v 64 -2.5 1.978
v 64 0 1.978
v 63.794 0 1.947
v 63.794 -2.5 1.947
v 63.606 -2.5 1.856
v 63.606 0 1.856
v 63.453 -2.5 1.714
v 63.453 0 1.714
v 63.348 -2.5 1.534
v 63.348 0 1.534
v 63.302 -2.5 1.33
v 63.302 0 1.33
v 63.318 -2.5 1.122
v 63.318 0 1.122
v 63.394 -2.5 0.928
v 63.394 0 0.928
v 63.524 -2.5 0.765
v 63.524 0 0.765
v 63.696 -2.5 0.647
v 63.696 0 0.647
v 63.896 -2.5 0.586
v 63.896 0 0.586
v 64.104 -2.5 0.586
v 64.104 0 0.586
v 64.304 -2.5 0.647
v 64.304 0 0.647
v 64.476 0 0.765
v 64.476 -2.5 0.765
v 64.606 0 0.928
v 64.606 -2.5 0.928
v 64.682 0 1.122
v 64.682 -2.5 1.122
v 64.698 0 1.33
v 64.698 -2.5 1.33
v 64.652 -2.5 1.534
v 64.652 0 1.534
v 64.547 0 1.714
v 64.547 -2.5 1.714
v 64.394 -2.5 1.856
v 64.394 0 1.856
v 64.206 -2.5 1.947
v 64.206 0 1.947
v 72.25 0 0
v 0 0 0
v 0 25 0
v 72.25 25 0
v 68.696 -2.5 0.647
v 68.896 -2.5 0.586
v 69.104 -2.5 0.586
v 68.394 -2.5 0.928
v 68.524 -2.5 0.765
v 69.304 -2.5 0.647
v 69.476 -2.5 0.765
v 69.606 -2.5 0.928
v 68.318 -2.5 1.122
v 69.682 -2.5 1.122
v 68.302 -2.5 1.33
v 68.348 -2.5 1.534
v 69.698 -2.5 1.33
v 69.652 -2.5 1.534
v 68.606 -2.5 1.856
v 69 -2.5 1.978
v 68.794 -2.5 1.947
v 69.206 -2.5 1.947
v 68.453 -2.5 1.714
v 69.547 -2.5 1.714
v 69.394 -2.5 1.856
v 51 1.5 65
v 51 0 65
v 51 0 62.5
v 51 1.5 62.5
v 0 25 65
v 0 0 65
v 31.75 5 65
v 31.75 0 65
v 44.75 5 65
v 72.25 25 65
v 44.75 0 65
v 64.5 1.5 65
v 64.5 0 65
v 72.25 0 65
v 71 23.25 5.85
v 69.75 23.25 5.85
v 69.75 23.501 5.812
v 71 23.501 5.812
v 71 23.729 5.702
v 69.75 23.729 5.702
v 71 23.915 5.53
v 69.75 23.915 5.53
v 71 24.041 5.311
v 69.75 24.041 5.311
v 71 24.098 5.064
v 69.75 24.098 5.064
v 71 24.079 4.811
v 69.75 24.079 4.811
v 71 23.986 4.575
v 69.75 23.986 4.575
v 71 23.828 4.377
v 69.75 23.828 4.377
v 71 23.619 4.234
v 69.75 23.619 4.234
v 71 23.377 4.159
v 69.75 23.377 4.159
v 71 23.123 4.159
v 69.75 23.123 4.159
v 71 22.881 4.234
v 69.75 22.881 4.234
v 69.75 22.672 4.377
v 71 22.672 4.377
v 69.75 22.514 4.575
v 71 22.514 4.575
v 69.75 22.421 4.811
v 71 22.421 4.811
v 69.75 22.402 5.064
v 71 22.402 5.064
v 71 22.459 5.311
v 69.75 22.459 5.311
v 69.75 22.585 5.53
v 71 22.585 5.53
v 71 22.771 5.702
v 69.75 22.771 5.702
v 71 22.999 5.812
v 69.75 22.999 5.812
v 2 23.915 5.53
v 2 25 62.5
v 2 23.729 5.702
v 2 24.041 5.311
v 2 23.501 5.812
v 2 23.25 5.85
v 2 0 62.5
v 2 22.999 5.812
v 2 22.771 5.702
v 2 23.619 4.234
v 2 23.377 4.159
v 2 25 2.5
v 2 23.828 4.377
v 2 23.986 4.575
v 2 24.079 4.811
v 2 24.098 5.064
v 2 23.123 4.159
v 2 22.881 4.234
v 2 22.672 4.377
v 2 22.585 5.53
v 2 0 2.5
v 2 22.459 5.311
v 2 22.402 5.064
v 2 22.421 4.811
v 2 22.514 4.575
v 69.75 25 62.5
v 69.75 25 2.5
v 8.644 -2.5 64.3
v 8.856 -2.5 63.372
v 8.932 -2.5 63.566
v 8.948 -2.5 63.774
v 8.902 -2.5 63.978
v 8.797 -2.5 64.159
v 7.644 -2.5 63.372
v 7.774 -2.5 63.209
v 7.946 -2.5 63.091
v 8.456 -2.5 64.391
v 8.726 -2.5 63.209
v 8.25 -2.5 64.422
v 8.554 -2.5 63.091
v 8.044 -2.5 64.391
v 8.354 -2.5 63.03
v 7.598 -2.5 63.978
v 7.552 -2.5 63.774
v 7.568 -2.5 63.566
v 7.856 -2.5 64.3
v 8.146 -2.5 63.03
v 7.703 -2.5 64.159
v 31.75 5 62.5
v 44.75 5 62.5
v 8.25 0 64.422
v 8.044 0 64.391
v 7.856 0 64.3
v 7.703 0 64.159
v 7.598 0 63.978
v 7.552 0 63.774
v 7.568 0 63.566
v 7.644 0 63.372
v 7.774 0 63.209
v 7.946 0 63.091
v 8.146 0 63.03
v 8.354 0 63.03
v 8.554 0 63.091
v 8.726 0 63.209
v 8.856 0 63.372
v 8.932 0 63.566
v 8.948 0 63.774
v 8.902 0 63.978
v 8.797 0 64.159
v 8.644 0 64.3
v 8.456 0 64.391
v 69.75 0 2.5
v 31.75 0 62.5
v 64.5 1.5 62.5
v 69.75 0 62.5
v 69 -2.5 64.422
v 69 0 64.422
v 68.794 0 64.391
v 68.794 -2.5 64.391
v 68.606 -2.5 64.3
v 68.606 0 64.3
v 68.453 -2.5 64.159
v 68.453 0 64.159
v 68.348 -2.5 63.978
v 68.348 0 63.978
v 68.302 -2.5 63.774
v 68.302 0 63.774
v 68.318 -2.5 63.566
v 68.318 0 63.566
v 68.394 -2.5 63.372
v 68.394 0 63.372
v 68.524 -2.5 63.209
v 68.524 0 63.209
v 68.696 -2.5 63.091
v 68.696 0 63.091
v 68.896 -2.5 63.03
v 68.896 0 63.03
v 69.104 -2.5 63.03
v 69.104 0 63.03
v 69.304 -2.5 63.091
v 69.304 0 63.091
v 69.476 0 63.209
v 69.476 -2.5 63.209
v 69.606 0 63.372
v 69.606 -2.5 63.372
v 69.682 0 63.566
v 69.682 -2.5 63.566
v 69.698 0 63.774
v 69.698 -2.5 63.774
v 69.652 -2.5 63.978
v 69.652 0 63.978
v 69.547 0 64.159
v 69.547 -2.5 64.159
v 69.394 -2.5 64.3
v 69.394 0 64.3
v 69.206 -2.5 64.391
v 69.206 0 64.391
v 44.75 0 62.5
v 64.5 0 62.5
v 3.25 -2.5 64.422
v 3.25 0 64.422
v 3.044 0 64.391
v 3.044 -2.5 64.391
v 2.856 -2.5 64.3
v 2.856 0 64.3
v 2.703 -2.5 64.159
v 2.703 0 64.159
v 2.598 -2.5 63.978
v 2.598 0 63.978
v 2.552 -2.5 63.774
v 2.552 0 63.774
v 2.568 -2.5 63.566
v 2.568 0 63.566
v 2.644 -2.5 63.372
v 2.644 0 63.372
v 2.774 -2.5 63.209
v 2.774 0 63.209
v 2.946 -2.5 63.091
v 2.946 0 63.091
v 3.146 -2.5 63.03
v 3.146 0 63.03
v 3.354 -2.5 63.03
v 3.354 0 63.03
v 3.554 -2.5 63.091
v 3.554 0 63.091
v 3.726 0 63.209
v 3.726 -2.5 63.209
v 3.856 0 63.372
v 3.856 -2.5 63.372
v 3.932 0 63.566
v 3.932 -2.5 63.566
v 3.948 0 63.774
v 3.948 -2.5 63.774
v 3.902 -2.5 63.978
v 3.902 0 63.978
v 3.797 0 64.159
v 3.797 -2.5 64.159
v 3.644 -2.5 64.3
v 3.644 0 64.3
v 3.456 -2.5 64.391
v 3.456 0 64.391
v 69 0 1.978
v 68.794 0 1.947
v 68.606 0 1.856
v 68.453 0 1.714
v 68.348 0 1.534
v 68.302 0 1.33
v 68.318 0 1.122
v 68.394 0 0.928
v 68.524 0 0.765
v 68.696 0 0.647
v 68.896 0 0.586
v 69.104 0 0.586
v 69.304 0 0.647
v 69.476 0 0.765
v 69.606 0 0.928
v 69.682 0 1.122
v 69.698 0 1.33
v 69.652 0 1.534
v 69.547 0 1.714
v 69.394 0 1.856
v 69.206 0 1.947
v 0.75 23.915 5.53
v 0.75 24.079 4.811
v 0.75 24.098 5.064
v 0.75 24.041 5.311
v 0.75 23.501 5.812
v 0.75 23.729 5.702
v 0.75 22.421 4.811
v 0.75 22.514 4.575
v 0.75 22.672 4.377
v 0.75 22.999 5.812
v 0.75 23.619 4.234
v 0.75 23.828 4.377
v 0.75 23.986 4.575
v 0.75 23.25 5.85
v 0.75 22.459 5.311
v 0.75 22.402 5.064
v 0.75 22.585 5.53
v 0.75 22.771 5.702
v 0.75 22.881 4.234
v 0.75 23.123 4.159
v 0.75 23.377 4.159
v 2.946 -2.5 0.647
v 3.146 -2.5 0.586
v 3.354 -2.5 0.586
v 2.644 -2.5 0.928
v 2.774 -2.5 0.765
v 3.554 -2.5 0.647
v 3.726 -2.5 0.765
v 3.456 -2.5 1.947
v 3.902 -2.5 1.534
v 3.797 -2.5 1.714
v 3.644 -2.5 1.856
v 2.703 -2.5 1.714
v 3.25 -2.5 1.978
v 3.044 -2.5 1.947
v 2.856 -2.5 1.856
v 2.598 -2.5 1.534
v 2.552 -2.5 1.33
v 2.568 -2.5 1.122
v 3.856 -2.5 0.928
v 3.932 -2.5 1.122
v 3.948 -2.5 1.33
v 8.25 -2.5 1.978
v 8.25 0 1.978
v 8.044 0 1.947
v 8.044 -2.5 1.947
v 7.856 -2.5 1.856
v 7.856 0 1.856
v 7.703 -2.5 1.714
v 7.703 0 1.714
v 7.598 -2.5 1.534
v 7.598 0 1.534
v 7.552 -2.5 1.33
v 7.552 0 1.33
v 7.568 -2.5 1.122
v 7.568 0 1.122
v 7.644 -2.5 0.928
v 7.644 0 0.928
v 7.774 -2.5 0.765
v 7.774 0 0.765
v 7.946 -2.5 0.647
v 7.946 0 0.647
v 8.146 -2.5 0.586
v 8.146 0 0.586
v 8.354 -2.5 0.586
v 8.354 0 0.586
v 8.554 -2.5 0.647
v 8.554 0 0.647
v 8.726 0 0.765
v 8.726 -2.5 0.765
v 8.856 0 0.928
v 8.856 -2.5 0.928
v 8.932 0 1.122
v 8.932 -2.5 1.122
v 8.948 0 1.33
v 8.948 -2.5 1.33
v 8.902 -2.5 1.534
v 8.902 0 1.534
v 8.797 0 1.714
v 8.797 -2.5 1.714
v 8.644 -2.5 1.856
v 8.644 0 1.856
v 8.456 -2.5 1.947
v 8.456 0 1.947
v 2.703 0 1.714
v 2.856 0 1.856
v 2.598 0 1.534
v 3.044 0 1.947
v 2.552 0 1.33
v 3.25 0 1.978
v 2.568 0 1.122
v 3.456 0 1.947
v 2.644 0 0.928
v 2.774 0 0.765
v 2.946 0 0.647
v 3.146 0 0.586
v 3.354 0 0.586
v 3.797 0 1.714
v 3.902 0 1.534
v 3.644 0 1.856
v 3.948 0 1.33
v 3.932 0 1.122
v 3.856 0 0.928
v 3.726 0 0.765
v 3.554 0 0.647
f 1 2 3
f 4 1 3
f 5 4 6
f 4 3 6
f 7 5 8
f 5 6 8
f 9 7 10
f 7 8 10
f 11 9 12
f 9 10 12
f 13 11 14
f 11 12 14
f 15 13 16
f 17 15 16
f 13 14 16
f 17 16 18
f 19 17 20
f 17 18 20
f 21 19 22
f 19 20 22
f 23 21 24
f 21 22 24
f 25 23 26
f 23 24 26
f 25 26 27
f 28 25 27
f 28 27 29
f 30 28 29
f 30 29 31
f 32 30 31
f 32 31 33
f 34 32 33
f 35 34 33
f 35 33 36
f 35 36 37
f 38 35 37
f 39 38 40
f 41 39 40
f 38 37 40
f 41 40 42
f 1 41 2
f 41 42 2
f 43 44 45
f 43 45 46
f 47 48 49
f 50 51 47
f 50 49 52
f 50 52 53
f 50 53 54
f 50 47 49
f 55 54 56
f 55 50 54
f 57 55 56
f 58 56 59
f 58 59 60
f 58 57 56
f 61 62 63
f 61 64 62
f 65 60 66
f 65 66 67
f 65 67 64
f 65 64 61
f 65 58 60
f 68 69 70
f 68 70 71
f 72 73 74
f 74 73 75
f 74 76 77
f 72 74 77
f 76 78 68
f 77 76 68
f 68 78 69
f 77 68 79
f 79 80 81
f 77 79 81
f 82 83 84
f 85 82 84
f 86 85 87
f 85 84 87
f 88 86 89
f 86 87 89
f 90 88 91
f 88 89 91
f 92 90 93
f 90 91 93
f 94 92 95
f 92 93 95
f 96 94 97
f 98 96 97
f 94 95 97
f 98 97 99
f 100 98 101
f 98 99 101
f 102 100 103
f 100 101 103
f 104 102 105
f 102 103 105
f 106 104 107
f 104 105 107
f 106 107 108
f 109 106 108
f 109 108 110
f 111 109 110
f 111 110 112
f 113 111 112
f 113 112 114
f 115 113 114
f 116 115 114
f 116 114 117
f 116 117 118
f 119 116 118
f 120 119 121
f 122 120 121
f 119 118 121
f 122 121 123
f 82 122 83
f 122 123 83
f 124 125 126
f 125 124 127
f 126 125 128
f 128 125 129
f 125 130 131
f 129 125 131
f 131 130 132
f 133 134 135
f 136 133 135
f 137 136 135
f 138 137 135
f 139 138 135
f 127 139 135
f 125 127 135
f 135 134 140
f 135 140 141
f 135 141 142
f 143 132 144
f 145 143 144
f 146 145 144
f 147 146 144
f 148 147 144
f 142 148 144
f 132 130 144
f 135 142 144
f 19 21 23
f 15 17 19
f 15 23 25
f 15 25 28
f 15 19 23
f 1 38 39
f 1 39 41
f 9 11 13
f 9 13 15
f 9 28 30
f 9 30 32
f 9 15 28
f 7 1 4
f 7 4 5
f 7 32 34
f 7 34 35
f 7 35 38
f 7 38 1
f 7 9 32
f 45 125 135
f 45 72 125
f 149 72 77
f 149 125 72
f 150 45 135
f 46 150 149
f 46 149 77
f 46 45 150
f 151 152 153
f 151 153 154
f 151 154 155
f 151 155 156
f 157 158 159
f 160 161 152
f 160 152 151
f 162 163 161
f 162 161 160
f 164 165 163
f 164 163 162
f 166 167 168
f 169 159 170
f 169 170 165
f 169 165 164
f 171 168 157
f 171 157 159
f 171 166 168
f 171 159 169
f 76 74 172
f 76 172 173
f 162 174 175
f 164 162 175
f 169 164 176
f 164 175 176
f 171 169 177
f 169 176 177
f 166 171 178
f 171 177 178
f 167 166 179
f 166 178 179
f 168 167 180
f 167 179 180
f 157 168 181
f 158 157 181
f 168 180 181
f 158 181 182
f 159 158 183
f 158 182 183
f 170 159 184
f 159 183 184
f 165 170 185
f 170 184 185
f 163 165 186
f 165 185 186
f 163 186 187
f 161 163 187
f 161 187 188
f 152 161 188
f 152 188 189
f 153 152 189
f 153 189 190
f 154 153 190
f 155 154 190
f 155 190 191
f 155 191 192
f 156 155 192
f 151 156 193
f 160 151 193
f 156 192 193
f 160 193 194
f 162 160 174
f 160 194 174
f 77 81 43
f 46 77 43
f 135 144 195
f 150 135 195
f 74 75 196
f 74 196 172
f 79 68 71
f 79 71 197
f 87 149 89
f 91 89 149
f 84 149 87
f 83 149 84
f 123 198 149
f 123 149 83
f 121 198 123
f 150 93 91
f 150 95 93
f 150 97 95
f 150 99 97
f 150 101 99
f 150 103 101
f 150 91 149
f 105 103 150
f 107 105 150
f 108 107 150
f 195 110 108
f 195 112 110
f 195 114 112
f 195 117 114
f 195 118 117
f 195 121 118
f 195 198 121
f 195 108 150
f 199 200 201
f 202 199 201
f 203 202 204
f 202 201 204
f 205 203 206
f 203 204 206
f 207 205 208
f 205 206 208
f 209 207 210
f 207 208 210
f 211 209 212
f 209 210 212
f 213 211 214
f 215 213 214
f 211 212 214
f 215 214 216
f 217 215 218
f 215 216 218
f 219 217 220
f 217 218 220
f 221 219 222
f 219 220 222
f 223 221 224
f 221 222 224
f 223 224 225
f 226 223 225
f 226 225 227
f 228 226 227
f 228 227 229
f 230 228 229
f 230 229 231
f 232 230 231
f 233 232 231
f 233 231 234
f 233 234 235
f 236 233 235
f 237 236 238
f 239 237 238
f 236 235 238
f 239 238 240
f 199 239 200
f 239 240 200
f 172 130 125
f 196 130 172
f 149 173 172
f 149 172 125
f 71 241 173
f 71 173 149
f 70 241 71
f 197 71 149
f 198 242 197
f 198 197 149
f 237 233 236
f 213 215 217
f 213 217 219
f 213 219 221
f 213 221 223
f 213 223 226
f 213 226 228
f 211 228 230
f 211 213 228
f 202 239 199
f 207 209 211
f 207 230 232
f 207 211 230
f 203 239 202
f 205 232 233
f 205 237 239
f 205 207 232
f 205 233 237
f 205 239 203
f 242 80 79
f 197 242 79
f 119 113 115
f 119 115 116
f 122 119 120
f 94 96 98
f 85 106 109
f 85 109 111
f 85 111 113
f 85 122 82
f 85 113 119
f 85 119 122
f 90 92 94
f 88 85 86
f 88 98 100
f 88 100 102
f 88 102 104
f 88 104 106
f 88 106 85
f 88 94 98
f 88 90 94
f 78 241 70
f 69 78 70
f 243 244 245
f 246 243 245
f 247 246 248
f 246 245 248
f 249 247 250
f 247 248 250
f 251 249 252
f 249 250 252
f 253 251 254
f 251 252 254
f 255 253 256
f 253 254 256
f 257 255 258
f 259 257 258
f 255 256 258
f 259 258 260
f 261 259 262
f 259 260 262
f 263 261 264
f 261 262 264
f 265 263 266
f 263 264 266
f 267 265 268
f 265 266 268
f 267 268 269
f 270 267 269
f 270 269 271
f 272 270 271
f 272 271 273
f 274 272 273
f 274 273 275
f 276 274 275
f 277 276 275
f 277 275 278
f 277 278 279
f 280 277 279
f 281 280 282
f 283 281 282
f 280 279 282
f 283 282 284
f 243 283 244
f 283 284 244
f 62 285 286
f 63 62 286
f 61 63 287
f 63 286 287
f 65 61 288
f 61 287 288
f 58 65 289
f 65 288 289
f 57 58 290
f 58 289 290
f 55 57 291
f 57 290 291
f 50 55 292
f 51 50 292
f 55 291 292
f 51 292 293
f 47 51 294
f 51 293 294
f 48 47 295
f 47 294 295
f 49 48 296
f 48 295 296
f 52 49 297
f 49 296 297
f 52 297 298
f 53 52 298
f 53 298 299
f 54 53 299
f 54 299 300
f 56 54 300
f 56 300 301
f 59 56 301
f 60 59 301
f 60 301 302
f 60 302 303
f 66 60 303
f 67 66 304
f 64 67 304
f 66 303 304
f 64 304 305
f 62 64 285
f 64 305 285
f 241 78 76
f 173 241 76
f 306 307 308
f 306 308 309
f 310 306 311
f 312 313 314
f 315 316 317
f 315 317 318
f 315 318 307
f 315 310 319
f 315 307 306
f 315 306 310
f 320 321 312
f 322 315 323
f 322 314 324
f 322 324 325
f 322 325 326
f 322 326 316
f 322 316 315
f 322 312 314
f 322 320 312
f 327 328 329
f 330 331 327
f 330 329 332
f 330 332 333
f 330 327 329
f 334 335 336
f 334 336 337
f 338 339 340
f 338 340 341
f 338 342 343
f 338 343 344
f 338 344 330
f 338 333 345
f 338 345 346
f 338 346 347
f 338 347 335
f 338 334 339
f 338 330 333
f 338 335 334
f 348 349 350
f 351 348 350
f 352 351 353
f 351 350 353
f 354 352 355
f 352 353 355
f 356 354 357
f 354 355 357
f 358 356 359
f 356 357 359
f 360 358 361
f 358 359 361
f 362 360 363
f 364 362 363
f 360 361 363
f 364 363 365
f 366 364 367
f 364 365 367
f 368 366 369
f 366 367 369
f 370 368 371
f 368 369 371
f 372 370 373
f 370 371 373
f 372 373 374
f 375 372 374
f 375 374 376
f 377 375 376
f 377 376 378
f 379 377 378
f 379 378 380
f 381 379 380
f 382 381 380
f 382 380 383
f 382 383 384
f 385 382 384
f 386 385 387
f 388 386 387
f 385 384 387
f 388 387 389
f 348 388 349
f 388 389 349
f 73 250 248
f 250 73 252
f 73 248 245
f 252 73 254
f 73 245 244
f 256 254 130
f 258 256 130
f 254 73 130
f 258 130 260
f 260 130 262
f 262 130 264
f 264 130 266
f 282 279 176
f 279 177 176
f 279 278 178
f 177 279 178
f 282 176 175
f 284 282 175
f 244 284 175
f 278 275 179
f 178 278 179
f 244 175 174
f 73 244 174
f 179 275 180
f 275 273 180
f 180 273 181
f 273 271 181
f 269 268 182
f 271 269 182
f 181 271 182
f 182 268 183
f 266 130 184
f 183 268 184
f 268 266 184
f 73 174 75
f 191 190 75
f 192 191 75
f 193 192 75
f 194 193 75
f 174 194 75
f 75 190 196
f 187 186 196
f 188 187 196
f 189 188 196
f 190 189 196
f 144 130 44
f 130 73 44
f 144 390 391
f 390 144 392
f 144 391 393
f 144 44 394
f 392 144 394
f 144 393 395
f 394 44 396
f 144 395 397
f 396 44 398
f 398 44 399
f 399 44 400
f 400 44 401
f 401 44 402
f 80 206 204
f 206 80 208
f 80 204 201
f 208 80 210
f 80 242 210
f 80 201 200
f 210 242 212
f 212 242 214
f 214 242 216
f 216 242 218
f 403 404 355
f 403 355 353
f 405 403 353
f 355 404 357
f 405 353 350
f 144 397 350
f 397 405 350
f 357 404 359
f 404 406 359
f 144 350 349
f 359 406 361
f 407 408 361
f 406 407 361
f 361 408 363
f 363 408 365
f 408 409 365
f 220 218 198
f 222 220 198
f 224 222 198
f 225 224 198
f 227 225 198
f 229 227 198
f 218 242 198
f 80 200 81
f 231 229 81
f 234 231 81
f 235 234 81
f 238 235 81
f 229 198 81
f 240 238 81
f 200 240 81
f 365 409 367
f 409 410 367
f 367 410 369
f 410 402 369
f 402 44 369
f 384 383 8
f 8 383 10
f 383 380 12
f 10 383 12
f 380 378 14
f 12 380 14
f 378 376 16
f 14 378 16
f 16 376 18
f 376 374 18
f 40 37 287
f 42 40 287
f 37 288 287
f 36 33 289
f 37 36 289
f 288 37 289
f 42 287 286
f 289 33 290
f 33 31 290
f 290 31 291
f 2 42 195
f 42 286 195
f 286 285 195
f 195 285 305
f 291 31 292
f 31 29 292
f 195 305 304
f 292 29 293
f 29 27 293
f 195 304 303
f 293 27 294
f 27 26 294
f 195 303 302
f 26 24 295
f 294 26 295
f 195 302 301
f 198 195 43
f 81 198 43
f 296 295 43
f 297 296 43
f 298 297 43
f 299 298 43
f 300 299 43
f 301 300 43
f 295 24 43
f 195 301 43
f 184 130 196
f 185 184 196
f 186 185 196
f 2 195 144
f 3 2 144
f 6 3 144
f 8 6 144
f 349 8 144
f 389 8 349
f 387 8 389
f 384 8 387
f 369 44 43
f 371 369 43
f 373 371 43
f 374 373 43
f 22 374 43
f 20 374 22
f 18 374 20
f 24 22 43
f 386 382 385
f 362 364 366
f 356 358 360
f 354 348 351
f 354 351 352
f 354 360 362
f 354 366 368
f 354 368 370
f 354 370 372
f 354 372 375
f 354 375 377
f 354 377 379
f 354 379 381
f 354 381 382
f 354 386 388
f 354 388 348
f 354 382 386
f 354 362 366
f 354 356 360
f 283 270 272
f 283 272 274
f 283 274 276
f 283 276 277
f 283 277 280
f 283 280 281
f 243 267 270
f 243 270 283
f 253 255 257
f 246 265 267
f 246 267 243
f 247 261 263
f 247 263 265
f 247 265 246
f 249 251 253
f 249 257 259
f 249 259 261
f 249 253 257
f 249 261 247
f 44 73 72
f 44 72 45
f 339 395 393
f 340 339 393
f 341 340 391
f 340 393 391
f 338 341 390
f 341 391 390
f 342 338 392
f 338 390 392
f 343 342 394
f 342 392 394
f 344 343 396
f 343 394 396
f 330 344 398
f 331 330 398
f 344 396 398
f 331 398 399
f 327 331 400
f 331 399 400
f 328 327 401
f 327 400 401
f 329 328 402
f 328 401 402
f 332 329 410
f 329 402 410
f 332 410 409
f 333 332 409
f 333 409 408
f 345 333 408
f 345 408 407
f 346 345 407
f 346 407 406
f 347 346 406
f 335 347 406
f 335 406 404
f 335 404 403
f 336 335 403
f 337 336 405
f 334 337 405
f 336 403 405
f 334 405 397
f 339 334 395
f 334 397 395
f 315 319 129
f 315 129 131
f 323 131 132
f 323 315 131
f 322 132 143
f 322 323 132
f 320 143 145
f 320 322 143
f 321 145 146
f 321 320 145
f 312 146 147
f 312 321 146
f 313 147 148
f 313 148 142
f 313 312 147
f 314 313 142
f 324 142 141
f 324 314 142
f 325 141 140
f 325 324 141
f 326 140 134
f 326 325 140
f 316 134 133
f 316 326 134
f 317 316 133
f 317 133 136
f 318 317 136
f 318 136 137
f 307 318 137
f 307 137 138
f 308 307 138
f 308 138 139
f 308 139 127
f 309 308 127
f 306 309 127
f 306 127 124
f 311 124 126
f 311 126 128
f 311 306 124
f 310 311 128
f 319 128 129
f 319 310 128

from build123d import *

# Parameters (mm, degrees)
SKETCH1_W           = 72.25
SKETCH1_H           = 65
SKETCH1_W_2         = 67.75
SKETCH1_H_2         = 60
BOSS_EXTRUDE1_DEPTH = 25
SKETCH2_W           = 13
SKETCH2_H           = 5
SKETCH2_W_2         = 13.5
SKETCH2_H_2         = 1.5
CUT_EXTRUDE1_DEPTH  = 2.5
SKETCH5_R           = 0.7
BOSS_EXTRUDE2_DEPTH = 2.5
SKETCH7_R           = 0.85
CUT_EXTRUDE3_DEPTH  = 1.25
CUT_EXTRUDE4_START  = -1.25
SKETCH8_R           = 0.85
CUT_EXTRUDE4_DEPTH  = 1.25


with BuildPart() as part:
    # Sketch1 → Boss-Extrude1 (new body)
    with BuildSketch(Plane(origin=(0, 0, 0), x_dir=(1, 0, 0), z_dir=(0, 1, 0))):
        with Locations((36.125, -32.5)):
            Rectangle(SKETCH1_W, SKETCH1_H)
        with Locations((35.875, -32.5)):
            Rectangle(SKETCH1_W_2, SKETCH1_H_2, mode=Mode.SUBTRACT)
    extrude(amount=BOSS_EXTRUDE1_DEPTH)

    # Sketch2 → Cut-Extrude1 (cut)
    with BuildSketch(Plane.XY.offset(65)):
        with Locations((38.25, 2.5)):
            Rectangle(SKETCH2_W, SKETCH2_H)
        with Locations((57.75, 0.75)):
            Rectangle(SKETCH2_W_2, SKETCH2_H_2)
    extrude(amount=-CUT_EXTRUDE1_DEPTH, mode=Mode.SUBTRACT)

    # Sketch5 → Boss-Extrude2 (add)
    with BuildSketch(Plane.XZ):
        with Locations(Location((3.25, 63.722069184, 0), (0, 0, 90))):
            Circle(SKETCH5_R)
        with Locations(Location((8.25, 63.722069184, 0), (0, 0, 90))):
            Circle(SKETCH5_R)
        with Locations(Location((3.25, 1.277930816, 0), (0, 0, 90))):
            Circle(SKETCH5_R)
        with Locations(Location((8.25, 1.277930816, 0), (0, 0, 90))):
            Circle(SKETCH5_R)
        with Locations(Location((69, 63.722069184, 0), (0, 0, 90))):
            Circle(SKETCH5_R)
        with Locations(Location((69, 1.277930816, 0), (0, 0, 90))):
            Circle(SKETCH5_R)
        with Locations(Location((64, 1.277930816, 0), (0, 0, 90))):
            Circle(SKETCH5_R)
    extrude(amount=BOSS_EXTRUDE2_DEPTH)

    # Sketch7 → Cut-Extrude3 (cut)
    with BuildSketch(Plane.ZY.offset(-69.75)):
        with Locations((5, 23.25)):
            Circle(SKETCH7_R)
    extrude(amount=-CUT_EXTRUDE3_DEPTH, mode=Mode.SUBTRACT)

    # Sketch8 → Cut-Extrude4 (cut)
    with BuildSketch(Plane(origin=(2, 0, 0), x_dir=(0, 0, -1), z_dir=(1, 0, 0)).offset(CUT_EXTRUDE4_START)):
        with Locations(Location((-5, 23.25, 0), (0, 0, 180))):
            Circle(SKETCH8_R)
    extrude(amount=CUT_EXTRUDE4_DEPTH, mode=Mode.SUBTRACT)


solid = part.part
